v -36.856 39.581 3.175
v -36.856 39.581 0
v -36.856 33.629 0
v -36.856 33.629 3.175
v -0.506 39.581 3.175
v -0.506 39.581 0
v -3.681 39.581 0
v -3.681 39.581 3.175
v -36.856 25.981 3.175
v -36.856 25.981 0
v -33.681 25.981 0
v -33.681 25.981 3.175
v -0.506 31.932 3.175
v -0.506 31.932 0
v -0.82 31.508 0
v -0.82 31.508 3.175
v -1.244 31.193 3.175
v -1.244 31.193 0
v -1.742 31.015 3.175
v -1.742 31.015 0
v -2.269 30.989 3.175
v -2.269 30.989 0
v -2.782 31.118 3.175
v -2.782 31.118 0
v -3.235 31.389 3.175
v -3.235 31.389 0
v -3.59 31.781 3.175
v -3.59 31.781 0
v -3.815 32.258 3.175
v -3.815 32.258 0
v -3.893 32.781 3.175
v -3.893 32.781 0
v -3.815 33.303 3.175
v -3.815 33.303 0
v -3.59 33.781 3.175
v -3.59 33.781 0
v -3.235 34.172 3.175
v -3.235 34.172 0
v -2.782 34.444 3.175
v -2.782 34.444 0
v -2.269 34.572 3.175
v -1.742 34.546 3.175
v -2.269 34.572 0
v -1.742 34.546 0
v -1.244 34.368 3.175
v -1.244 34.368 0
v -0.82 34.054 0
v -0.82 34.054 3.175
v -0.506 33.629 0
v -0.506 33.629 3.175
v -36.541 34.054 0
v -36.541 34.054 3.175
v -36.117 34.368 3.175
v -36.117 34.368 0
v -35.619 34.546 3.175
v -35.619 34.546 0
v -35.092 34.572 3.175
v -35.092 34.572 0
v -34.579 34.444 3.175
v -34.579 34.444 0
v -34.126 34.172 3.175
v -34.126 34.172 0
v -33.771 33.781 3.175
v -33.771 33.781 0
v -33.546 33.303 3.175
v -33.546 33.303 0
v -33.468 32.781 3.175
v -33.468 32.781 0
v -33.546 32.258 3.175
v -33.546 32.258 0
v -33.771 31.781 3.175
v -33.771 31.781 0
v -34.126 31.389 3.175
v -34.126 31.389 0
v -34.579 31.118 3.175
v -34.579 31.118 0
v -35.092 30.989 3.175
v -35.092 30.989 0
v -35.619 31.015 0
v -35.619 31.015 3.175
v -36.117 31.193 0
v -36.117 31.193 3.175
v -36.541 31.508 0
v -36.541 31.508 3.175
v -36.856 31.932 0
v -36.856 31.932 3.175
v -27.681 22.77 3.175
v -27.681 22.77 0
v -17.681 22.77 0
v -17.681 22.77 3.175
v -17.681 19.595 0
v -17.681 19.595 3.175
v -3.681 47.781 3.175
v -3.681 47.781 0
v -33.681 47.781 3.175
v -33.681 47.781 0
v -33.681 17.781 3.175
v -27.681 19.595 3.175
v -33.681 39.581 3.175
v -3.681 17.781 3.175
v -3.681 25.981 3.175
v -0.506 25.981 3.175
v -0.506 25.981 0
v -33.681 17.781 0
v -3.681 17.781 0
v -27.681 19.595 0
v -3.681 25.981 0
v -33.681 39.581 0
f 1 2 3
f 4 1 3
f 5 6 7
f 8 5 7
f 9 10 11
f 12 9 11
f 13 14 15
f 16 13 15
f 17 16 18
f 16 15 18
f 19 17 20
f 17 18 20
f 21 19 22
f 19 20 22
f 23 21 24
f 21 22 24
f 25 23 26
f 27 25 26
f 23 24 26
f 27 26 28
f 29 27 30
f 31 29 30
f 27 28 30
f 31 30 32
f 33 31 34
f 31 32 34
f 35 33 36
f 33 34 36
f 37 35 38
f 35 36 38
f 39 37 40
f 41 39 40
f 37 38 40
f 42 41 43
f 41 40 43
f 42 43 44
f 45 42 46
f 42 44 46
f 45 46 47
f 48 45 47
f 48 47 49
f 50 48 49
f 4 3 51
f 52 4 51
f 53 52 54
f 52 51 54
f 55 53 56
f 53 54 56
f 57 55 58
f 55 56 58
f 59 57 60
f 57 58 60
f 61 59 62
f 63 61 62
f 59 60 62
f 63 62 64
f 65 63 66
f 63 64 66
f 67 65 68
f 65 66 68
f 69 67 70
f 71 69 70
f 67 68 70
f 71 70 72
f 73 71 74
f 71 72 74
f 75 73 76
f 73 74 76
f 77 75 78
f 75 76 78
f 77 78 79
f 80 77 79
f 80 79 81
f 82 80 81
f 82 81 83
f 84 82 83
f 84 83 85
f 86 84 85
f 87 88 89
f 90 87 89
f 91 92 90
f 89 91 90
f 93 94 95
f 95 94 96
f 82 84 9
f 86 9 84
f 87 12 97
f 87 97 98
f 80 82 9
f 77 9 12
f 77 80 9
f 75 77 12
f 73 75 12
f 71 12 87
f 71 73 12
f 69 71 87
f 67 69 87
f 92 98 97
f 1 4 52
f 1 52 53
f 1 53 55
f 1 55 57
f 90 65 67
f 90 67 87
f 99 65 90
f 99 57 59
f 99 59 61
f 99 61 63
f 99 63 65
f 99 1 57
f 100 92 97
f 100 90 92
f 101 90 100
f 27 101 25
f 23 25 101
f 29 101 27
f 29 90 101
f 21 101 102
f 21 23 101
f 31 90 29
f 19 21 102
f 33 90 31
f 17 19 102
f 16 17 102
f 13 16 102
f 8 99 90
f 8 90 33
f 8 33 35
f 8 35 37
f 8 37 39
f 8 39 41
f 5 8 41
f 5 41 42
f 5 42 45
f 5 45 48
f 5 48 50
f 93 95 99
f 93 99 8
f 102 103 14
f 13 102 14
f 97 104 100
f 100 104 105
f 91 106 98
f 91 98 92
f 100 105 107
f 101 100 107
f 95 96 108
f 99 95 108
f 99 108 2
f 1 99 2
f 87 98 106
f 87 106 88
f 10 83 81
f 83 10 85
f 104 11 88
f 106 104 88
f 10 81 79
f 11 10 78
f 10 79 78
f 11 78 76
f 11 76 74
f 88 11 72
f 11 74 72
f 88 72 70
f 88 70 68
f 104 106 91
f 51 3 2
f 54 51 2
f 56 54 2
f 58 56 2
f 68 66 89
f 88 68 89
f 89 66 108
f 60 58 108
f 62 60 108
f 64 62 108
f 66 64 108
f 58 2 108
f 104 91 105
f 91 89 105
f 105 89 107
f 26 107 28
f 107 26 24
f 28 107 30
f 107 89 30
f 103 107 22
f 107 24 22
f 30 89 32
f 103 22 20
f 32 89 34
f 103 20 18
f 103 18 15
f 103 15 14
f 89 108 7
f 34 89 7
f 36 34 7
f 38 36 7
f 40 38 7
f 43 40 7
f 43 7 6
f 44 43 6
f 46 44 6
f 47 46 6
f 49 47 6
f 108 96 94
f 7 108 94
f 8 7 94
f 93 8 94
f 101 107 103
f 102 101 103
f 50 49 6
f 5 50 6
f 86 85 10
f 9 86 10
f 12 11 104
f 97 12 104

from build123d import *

# Parameters (mm, degrees)
SKETCH1_W           = 10
SKETCH1_H           = 3.175
BOSS_EXTRUDE4_DEPTH = 3.175


with BuildPart() as part:
    # Sketch1 → Boss-Extrude4 (new body)
    with BuildSketch(Plane.XY):
        with BuildLine():
            Line((-33.68050161, 39.580766243), (-36.85550161, 39.580766243))
            Line((-36.85550161, 39.580766243), (-36.85550161, 33.629202304))
            ThreePointArc((-36.85550161, 33.629202304), (-33.46800161, 32.780766243), (-36.85550161, 31.932330182))
            Line((-36.85550161, 31.932330182), (-36.85550161, 25.980766243))
            Line((-36.85550161, 25.980766243), (-33.68050161, 25.980766243))
            Line((-33.68050161, 25.980766243), (-33.68050161, 17.780766243))
            Line((-33.68050161, 17.780766243), (-3.68050161, 17.780766243))
            Line((-3.68050161, 17.780766243), (-3.68050161, 25.980766243))
            Line((-3.68050161, 25.980766243), (-0.50550161, 25.980766243))
            Line((-0.50550161, 25.980766243), (-0.50550161, 31.932330182))
            ThreePointArc((-0.50550161, 31.932330182), (-3.89300161, 32.780766243), (-0.50550161, 33.629202304))
            Line((-0.50550161, 33.629202304), (-0.50550161, 39.580766243))
            Line((-0.50550161, 39.580766243), (-3.68050161, 39.580766243))
            Line((-3.68050161, 39.580766243), (-3.68050161, 47.780766243))
            Line((-3.68050161, 47.780766243), (-33.68050161, 47.780766243))
            Line((-33.68050161, 47.780766243), (-33.68050161, 39.580766243))
        make_face()
        with Locations((-22.68050161, 21.182701237)):
            Rectangle(SKETCH1_W, SKETCH1_H, mode=Mode.SUBTRACT)
    extrude(amount=BOSS_EXTRUDE4_DEPTH)


solid = part.part
